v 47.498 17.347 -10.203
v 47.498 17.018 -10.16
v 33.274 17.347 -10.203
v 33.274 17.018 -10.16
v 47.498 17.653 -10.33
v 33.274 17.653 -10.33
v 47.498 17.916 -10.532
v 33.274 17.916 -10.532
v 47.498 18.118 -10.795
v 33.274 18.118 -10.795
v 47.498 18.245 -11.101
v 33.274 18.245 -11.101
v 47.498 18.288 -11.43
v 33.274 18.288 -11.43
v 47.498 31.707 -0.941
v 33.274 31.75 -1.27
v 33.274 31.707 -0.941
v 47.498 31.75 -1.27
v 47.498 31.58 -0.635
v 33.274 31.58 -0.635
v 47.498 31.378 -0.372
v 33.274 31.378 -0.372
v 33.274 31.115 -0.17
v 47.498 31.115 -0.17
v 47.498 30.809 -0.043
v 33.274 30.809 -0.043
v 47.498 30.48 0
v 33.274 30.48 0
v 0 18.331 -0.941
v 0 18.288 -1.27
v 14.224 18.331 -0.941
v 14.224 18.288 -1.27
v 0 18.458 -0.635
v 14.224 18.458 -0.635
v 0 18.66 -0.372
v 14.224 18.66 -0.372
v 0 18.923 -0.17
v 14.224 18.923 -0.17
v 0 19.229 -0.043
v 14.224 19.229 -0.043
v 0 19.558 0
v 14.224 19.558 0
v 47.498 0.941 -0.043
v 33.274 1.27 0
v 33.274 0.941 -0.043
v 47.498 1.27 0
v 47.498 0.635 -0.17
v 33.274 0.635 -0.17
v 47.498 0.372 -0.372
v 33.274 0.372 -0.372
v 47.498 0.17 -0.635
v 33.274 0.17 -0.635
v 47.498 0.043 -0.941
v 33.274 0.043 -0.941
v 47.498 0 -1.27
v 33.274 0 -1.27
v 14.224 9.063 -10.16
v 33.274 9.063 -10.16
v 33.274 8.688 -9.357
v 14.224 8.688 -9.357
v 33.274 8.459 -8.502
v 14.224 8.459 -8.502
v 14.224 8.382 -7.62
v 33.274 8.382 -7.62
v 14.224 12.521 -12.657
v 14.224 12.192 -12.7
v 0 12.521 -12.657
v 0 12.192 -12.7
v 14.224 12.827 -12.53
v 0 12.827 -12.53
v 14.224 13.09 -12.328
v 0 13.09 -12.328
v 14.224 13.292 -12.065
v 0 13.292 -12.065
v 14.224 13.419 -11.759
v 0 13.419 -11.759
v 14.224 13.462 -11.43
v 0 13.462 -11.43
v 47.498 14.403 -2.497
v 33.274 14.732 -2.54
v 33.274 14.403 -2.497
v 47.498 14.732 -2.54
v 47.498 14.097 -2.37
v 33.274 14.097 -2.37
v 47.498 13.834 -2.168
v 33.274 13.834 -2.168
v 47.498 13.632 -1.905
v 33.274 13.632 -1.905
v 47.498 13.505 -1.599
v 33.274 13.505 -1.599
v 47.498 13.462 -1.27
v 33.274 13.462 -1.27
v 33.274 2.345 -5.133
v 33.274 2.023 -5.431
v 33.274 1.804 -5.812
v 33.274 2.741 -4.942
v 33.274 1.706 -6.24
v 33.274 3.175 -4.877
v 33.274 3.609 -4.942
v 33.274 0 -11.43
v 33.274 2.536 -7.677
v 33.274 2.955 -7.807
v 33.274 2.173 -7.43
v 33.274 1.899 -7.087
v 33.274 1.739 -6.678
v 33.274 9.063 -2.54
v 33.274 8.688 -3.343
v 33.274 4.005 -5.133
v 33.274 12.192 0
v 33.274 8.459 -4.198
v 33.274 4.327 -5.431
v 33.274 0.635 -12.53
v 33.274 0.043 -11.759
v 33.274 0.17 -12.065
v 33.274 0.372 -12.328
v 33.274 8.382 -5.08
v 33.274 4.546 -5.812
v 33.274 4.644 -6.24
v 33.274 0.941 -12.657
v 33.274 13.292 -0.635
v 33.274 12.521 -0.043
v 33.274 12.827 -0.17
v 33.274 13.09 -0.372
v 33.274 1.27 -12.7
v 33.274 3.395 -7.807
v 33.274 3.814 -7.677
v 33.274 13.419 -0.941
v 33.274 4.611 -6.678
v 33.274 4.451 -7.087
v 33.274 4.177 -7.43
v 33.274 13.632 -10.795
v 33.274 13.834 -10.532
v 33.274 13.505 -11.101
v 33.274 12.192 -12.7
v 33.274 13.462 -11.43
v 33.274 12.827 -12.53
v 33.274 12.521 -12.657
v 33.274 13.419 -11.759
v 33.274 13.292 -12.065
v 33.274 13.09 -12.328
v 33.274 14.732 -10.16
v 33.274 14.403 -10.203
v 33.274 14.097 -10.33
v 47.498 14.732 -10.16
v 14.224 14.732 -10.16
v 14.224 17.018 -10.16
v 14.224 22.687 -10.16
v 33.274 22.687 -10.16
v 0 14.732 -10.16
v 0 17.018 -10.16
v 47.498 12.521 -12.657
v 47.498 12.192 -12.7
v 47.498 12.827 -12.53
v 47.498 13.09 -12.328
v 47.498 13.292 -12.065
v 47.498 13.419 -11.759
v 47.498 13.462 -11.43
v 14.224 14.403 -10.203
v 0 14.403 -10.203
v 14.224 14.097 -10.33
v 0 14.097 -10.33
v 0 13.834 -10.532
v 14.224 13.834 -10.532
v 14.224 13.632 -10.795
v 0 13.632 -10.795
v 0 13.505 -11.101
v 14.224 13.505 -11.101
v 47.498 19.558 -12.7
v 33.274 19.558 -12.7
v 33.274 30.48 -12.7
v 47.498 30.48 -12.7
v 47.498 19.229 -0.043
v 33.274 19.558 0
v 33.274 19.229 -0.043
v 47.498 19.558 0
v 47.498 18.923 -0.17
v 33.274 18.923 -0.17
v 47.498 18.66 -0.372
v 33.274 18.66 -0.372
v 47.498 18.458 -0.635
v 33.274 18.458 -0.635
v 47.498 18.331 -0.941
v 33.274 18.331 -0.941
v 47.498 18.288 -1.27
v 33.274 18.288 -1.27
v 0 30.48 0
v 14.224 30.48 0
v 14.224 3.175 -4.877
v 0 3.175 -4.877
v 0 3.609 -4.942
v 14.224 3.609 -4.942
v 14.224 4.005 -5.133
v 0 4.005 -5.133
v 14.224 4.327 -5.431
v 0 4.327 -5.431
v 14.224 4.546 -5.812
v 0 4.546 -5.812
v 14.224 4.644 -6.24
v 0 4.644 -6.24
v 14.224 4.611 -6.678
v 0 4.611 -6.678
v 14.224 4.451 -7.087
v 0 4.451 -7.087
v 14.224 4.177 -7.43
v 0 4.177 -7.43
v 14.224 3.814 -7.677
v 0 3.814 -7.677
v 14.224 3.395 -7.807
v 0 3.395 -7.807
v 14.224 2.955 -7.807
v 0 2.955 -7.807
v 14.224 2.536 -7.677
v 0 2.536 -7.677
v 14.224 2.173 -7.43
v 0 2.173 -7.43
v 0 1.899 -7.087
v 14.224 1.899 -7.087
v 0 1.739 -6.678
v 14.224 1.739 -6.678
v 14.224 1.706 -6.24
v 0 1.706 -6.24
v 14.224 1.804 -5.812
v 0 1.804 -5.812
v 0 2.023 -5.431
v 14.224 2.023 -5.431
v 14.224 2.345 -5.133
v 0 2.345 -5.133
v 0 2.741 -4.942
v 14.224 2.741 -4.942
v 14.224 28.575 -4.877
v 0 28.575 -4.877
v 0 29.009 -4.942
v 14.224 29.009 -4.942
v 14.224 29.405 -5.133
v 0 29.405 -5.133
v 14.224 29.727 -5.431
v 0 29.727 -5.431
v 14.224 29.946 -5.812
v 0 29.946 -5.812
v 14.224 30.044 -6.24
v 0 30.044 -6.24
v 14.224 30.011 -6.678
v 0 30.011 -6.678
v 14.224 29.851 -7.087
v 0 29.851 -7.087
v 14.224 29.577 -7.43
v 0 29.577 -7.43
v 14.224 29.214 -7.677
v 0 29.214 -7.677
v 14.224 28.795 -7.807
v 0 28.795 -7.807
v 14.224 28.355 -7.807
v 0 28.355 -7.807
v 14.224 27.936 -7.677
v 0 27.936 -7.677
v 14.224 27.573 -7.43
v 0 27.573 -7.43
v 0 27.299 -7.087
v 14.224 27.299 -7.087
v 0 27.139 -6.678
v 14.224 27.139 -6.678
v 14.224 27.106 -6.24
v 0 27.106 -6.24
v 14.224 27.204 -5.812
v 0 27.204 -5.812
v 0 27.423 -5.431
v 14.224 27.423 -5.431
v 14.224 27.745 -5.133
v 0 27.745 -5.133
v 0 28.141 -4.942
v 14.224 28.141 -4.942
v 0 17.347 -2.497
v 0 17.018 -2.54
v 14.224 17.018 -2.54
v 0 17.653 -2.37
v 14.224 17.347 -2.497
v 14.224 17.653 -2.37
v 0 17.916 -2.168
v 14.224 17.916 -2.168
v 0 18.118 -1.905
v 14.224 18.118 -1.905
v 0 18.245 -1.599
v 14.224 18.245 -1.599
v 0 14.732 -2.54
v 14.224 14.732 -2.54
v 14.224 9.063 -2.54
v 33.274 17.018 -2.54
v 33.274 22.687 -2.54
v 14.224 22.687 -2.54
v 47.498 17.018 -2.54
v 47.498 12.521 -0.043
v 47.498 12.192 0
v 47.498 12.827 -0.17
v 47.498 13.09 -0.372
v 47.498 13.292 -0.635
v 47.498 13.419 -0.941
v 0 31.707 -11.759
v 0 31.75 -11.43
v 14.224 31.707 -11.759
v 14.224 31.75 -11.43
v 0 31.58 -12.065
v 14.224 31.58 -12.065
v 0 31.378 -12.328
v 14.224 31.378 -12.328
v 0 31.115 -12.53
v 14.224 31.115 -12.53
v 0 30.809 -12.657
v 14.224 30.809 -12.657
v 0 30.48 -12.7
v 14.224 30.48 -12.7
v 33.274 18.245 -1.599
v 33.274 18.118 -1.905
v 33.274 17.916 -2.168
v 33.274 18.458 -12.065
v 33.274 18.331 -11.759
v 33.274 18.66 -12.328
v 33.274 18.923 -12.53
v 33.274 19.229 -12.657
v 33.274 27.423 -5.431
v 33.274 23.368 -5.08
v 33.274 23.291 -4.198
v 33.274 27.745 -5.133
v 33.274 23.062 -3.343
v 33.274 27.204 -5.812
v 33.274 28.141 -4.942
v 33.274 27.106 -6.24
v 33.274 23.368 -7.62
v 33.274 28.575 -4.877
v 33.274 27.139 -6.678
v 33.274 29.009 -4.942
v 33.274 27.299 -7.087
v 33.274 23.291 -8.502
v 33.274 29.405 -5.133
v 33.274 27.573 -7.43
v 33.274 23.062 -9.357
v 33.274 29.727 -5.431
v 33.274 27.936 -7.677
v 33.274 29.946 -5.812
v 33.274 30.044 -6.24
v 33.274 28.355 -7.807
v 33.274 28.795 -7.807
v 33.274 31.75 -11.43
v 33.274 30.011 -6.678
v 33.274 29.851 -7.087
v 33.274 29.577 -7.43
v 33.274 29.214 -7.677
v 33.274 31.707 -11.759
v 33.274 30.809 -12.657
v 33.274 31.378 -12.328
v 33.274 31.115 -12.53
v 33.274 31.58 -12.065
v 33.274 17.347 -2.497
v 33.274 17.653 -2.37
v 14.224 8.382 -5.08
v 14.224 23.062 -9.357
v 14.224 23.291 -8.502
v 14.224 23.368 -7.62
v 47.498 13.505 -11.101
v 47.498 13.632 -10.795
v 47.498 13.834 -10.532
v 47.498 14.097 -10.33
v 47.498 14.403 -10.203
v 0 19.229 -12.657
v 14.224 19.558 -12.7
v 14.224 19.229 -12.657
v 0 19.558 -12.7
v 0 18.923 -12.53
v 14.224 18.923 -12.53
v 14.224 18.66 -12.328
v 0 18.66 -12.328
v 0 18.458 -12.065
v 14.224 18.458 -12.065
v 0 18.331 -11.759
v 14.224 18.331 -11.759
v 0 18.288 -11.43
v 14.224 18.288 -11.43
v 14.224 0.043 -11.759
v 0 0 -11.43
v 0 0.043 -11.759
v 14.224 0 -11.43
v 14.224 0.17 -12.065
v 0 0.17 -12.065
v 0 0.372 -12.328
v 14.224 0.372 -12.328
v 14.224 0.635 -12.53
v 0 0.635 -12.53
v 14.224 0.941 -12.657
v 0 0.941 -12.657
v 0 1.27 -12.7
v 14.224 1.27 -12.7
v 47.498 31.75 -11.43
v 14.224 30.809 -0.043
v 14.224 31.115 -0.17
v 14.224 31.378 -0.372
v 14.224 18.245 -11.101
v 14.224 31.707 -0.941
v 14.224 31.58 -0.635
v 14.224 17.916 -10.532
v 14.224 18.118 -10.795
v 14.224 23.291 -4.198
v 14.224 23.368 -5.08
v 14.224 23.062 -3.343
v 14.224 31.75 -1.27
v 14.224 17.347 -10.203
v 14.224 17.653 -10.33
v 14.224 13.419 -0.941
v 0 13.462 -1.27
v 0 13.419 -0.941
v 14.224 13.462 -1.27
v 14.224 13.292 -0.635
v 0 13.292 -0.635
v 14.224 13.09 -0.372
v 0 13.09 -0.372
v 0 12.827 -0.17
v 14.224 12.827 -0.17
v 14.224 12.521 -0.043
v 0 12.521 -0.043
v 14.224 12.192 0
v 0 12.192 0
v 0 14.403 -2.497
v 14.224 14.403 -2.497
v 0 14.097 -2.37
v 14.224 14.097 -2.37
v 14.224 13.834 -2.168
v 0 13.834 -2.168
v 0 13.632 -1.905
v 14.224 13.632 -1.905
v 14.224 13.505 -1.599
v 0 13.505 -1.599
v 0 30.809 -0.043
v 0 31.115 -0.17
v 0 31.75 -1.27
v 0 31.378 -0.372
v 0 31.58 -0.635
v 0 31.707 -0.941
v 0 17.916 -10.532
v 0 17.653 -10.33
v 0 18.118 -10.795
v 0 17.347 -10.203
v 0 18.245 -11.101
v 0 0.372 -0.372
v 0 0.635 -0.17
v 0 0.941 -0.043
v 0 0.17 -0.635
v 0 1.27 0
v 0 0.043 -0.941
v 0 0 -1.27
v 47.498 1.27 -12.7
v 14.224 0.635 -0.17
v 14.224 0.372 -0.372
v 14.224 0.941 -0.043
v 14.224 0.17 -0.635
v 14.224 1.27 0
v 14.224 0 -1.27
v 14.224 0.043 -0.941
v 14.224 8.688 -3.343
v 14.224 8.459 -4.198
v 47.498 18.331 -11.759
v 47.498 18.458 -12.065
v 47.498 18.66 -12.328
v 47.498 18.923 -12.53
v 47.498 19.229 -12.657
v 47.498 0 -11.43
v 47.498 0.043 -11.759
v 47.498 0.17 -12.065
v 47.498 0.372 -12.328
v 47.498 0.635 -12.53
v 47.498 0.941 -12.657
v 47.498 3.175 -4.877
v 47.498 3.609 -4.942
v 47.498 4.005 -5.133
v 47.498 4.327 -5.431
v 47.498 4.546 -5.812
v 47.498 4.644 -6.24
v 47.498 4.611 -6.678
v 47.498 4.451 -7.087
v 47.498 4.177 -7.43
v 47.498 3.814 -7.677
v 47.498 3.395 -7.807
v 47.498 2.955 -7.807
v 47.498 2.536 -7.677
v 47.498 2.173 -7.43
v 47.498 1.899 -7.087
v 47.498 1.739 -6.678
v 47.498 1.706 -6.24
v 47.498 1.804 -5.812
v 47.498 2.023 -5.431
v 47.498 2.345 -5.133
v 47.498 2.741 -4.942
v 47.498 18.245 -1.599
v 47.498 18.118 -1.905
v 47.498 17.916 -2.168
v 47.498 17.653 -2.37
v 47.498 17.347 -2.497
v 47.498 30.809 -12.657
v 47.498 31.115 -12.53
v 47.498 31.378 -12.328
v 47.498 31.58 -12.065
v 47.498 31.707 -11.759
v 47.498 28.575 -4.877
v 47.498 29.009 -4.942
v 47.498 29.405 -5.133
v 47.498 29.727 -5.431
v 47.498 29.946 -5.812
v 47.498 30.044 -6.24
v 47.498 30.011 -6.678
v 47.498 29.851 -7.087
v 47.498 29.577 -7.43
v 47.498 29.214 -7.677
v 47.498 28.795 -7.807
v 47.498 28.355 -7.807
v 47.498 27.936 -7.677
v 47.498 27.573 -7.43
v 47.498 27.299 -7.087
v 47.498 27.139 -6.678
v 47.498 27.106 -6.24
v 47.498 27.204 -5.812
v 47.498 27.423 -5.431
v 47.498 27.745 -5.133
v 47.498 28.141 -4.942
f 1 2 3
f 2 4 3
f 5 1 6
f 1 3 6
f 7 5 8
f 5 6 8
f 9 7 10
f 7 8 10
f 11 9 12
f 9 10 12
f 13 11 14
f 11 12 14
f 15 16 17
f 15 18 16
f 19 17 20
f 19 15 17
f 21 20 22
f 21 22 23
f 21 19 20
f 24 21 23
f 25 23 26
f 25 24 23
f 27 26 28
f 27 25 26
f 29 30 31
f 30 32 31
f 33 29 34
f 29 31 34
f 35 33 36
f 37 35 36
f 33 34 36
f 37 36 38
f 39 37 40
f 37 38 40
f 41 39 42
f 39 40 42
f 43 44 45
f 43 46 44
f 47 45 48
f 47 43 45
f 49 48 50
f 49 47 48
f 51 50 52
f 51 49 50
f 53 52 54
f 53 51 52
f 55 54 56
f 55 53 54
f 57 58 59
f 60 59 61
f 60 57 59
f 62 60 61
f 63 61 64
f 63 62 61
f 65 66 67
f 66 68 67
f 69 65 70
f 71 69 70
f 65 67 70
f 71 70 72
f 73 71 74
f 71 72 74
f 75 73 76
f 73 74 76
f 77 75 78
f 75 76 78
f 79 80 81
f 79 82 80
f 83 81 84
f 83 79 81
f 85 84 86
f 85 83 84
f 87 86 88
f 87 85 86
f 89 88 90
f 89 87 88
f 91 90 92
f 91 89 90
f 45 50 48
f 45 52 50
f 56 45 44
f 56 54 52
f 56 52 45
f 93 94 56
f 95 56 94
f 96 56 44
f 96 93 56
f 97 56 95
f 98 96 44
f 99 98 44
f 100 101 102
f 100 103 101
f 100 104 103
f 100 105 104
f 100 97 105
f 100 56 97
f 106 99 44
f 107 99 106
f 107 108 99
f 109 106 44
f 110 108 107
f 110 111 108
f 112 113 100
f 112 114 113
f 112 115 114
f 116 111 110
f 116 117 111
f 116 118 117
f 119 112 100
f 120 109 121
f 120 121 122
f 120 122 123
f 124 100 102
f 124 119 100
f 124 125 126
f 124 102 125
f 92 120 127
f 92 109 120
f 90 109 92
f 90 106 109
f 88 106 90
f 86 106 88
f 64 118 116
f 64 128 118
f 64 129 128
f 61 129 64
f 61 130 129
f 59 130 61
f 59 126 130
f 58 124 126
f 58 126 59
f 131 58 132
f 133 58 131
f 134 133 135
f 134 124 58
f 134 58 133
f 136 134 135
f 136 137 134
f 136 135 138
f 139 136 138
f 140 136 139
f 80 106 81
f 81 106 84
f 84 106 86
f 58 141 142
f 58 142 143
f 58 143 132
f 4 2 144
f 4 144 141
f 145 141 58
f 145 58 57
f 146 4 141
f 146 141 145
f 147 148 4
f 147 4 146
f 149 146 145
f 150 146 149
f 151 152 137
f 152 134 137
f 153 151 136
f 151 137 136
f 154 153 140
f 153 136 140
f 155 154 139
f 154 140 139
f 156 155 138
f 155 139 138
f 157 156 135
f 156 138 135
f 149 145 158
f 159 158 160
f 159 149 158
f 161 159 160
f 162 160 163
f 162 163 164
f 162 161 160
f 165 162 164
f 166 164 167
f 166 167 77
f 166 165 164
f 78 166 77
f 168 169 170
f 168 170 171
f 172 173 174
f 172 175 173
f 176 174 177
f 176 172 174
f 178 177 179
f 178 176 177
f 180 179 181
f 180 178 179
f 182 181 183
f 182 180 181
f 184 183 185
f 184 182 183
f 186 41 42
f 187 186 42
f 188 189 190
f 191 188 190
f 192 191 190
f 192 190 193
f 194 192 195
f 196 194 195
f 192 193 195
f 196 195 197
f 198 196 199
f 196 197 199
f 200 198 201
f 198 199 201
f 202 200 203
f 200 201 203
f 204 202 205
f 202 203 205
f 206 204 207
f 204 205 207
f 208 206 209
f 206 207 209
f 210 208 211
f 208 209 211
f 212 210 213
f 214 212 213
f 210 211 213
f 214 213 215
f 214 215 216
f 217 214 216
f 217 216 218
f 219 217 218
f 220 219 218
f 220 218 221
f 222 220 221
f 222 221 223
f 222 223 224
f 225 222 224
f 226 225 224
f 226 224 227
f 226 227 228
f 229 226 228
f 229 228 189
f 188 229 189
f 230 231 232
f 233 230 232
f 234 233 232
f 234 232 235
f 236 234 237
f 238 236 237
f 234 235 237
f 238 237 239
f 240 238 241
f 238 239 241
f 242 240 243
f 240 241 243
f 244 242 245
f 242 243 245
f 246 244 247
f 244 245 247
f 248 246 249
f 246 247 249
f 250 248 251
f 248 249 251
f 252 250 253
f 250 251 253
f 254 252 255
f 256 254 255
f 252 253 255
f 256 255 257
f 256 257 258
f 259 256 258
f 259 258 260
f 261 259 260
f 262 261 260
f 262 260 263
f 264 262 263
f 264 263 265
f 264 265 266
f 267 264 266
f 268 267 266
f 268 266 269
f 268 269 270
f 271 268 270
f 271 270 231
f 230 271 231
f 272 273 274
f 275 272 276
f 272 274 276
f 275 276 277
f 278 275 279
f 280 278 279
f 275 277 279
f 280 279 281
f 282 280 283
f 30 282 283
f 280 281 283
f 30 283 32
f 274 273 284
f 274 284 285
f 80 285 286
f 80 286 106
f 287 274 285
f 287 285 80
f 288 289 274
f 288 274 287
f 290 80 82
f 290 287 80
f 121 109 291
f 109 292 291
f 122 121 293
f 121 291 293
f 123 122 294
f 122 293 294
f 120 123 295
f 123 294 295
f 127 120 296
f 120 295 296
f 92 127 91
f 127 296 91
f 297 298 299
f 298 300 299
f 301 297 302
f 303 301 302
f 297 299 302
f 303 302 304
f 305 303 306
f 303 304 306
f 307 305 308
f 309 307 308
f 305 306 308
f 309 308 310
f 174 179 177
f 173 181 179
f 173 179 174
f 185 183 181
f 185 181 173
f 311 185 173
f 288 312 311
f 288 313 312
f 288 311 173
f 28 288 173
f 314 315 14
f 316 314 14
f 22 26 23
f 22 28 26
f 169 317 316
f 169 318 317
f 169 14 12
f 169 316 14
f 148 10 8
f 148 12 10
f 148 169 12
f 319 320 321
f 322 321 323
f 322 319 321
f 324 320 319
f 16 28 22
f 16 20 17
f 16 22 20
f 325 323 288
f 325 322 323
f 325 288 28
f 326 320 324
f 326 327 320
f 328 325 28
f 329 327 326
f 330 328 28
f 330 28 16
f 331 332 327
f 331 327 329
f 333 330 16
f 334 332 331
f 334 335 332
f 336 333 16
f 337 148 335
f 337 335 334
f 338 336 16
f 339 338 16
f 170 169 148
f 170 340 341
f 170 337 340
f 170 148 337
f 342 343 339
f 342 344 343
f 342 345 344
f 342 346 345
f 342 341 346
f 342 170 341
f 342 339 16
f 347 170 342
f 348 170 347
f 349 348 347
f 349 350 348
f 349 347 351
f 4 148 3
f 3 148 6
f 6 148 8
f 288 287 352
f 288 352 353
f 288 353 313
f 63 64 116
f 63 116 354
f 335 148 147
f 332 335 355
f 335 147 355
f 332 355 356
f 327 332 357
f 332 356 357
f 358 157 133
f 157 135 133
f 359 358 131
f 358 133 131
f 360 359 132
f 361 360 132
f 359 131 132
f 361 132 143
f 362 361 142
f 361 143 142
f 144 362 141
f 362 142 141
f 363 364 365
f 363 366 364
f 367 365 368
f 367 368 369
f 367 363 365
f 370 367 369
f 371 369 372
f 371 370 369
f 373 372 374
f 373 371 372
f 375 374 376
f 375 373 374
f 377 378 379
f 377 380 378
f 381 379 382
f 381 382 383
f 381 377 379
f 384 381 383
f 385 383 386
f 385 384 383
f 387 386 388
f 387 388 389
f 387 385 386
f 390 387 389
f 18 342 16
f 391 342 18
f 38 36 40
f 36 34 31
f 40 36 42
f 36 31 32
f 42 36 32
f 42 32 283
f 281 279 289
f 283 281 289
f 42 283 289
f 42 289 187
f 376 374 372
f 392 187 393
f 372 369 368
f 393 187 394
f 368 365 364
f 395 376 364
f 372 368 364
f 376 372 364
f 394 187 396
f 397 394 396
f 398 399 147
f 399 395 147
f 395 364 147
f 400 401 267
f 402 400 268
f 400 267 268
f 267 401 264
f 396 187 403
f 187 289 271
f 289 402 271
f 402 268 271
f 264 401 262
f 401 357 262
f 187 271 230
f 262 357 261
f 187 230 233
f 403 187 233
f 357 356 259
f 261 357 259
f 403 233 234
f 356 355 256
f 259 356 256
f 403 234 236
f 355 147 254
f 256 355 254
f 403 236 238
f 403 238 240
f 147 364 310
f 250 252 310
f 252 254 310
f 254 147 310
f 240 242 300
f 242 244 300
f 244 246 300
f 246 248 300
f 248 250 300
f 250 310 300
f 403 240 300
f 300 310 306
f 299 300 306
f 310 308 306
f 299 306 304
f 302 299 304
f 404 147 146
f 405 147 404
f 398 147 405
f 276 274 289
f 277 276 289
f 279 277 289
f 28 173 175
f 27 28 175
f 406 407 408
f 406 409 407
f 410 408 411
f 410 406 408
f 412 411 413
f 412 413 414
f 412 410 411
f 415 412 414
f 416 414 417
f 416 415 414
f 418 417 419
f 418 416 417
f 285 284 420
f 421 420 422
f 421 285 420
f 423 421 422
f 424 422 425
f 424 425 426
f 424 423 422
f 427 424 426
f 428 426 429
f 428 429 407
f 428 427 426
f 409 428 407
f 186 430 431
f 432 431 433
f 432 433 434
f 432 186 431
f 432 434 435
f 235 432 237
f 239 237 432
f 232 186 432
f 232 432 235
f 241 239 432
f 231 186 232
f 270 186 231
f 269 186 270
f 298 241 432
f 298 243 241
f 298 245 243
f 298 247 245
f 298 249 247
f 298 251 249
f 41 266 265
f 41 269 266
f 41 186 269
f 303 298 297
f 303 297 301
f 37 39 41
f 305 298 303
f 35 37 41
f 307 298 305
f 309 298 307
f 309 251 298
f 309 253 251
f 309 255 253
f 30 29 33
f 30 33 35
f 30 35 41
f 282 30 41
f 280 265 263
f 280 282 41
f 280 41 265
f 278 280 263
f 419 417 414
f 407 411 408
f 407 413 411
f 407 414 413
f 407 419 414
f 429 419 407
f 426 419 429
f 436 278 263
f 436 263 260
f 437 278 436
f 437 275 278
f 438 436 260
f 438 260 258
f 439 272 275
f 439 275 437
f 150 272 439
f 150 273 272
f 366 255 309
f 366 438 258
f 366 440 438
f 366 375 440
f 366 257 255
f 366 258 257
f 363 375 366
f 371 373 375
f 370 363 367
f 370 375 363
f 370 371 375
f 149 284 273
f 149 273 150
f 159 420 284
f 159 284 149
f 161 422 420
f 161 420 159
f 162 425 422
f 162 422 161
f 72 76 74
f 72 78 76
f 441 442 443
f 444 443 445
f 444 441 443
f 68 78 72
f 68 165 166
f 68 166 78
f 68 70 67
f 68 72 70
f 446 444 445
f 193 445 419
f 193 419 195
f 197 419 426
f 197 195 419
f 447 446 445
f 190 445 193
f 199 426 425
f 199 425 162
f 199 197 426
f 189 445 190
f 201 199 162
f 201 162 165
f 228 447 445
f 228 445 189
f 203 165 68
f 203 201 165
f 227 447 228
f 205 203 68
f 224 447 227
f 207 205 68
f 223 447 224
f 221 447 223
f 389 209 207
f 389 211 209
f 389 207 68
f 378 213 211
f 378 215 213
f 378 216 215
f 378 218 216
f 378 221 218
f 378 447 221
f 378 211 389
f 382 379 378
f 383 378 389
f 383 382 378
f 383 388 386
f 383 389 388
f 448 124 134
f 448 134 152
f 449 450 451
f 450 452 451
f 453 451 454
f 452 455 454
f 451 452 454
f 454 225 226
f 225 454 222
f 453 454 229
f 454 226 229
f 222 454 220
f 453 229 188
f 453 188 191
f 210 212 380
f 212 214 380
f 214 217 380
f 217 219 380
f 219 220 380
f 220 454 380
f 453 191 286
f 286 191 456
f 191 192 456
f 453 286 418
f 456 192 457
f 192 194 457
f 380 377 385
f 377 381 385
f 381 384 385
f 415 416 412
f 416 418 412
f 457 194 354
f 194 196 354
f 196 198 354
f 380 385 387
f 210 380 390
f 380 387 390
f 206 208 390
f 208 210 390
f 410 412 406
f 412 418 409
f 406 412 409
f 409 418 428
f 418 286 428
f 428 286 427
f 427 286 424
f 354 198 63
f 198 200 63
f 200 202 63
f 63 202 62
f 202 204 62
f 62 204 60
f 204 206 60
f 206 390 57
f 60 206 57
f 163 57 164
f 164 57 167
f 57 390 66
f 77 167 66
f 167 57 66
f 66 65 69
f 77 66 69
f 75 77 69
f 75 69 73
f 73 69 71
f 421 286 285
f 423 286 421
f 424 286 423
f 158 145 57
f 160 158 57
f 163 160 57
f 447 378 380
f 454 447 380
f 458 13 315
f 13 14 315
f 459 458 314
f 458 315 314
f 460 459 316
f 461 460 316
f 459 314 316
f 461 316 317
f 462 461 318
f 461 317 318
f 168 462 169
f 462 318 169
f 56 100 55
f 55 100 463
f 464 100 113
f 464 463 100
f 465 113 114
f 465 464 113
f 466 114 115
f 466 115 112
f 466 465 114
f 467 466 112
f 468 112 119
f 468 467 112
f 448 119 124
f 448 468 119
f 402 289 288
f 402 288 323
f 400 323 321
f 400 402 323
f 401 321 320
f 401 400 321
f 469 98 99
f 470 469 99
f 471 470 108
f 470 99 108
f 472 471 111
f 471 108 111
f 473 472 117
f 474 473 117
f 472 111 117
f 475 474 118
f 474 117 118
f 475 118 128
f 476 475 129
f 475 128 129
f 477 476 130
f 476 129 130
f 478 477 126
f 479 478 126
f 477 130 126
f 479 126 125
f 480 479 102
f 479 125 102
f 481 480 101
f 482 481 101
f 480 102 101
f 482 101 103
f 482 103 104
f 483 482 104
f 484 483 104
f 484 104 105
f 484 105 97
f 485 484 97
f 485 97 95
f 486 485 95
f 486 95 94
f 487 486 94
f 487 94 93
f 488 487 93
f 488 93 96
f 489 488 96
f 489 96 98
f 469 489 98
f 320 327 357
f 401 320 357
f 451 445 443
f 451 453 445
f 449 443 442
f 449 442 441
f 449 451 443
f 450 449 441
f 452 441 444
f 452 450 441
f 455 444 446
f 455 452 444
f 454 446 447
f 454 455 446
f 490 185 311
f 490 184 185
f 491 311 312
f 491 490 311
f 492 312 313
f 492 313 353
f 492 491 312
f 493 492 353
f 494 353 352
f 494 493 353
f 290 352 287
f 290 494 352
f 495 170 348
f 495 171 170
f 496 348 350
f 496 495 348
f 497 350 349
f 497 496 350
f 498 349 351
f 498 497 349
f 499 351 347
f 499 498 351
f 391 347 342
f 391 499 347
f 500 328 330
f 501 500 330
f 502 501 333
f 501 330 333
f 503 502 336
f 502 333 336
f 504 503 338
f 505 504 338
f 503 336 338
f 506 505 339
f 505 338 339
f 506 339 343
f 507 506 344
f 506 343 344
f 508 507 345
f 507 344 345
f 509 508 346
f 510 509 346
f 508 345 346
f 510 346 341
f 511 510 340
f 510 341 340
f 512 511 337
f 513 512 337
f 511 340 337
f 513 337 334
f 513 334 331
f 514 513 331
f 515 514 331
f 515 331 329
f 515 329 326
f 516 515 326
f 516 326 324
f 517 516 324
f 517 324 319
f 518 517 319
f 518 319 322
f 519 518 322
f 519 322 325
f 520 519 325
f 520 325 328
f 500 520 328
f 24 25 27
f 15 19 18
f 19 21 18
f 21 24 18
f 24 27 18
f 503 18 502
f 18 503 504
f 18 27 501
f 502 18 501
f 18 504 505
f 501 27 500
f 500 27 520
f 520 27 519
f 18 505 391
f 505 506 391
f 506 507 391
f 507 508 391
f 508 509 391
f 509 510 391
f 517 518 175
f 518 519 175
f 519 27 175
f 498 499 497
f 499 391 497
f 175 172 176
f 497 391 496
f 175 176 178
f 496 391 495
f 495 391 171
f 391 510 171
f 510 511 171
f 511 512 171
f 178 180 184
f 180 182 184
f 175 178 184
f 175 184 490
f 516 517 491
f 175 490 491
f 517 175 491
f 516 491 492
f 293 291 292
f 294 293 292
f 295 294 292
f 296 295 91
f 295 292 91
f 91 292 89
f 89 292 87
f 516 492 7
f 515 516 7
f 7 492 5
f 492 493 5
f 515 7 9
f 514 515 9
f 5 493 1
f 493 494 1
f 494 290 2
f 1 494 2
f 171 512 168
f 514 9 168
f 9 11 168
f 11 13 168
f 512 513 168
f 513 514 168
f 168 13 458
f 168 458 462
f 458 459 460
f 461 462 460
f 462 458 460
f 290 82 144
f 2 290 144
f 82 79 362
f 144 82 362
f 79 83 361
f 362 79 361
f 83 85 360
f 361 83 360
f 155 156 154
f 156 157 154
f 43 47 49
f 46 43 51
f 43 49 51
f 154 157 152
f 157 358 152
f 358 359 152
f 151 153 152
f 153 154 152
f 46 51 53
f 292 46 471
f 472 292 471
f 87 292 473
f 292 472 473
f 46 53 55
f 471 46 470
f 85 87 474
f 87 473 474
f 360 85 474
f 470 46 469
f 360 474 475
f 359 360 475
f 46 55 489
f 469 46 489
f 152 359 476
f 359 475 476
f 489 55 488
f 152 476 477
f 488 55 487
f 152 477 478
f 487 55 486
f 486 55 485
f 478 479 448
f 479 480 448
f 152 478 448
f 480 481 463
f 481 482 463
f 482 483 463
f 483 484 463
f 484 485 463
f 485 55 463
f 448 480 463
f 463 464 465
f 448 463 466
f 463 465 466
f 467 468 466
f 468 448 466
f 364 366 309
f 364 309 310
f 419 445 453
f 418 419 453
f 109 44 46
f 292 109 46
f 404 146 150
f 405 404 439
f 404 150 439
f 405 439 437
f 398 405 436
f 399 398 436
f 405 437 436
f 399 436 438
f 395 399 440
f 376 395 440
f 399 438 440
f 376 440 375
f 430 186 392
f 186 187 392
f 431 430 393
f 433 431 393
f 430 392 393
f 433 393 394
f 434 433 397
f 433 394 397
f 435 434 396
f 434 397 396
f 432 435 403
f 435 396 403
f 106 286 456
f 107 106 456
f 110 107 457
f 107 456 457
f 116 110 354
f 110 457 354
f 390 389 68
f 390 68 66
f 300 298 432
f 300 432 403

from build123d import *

# Parameters (mm, degrees)
SKETCH1_W           = 47.498
SKETCH1_H           = 12.7
BOSS_EXTRUDE1_DEPTH = 31.75
SKETCH2_R           = 1.4732
CUT_EXTRUDE1_DEPTH  = 47.498
SKETCH3_W           = 19.05
SKETCH3_H           = 8.382
CUT_EXTRUDE2_DEPTH  = 47.498
FILLET1_R           = 5.08
SKETCH4_W           = 47.498
SKETCH4_H           = 4.826
CUT_EXTRUDE3_DEPTH  = 2.54
SKETCH5_W           = 47.498
SKETCH5_H           = 4.826
CUT_EXTRUDE4_DEPTH  = 2.54
SKETCH6_W           = 19.05
SKETCH6_H           = 19.05
CUT_EXTRUDE5_DEPTH  = 2.54
SKETCH7_W           = 19.05
SKETCH7_H           = 17.006147254
CUT_EXTRUDE6_DEPTH  = 2.54
FILLET2_R           = 1.27


with BuildPart() as part:
    # Sketch1 → Boss-Extrude1 (new body)
    with BuildSketch(Plane(origin=(0, 0, 0), x_dir=(1, 0, 0), z_dir=(0, 1, 0))):
        with Locations((23.749, 6.35)):
            Rectangle(SKETCH1_W, SKETCH1_H)
    extrude(amount=BOSS_EXTRUDE1_DEPTH)

    # Sketch2 → Cut-Extrude1 (cut)
    with BuildSketch(Plane.ZY):
        with Locations((-6.35, 3.175)):
            Circle(SKETCH2_R)
        with Locations((-6.35, 28.575)):
            Circle(SKETCH2_R)
    extrude(amount=-CUT_EXTRUDE1_DEPTH, mode=Mode.SUBTRACT)

    # Sketch3 → Cut-Extrude2 (cut)
    with BuildSketch(Plane(origin=(0, 0, -12.7), x_dir=(-1, 0, 0), z_dir=(0, 0, -1))):
        with Locations((-23.749, 4.191)):
            Rectangle(SKETCH3_W, SKETCH3_H)
        with Locations((-23.749, 27.559)):
            Rectangle(SKETCH3_W, SKETCH3_H)
    extrude(amount=-CUT_EXTRUDE2_DEPTH, mode=Mode.SUBTRACT)

    # Fillet1
    fillet1_edges = [part.edges().sort_by_distance(p)[0] for p in [
        (23.749, 8.382, 0),
        (23.749, 8.382, -12.7),
        (23.749, 23.368, 0),
        (23.749, 23.368, -12.7),
    ]]
    fillet(fillet1_edges, radius=FILLET1_R)

    # Sketch4 → Cut-Extrude3 (cut)
    with BuildSketch(Plane.XY):
        with Locations((23.749, 15.875)):
            Rectangle(SKETCH4_W, SKETCH4_H)
    extrude(amount=-CUT_EXTRUDE3_DEPTH, mode=Mode.SUBTRACT)

    # Sketch5 → Cut-Extrude4 (cut)
    with BuildSketch(Plane(origin=(0, 0, -12.7), x_dir=(-1, 0, 0), z_dir=(0, 0, -1))):
        with Locations((-23.749, 15.875)):
            Rectangle(SKETCH5_W, SKETCH5_H)
    extrude(amount=-CUT_EXTRUDE4_DEPTH, mode=Mode.SUBTRACT)

    # Sketch6 → Cut-Extrude5 (cut)
    with BuildSketch(Plane.XY):
        with Locations((23.749, 17.907)):
            Rectangle(SKETCH6_W, SKETCH6_H)
    extrude(amount=-CUT_EXTRUDE5_DEPTH, mode=Mode.SUBTRACT)

    # Sketch7 → Cut-Extrude6 (cut)
    with BuildSketch(Plane(origin=(0, 0, -12.7), x_dir=(-1, 0, 0), z_dir=(0, 0, -1))):
        with Locations((-23.749, 16.885073627)):
            Rectangle(SKETCH7_W, SKETCH7_H)
    extrude(amount=-CUT_EXTRUDE6_DEPTH, mode=Mode.SUBTRACT)

    # Fillet2
    fillet2_edges = [part.edges().sort_by_distance(p)[0] for p in [
        (40.386, 13.462, 0),
        (40.386, 13.462, -2.54),
        (40.386, 18.288, -2.54),
        (40.386, 18.288, 0),
        (7.112, 13.462, 0),
        (7.112, 13.462, -2.54),
        (7.112, 18.288, -2.54),
        (7.112, 18.288, 0),
        (7.112, 31.75, 0),
        (40.386, 31.75, 0),
        (7.112, 0, 0),
        (40.386, 0, 0),
        (40.386, 0, -12.7),
        (40.386, 31.75, -12.7),
        (40.386, 13.462, -12.7),
        (40.386, 13.462, -10.16),
        (40.386, 18.288, -10.16),
        (40.386, 18.288, -12.7),
        (7.112, 31.75, -12.7),
        (7.112, 18.288, -12.7),
        (7.112, 18.288, -10.16),
        (7.112, 0, -12.7),
        (7.112, 13.462, -12.7),
        (7.112, 13.462, -10.16),
    ]]
    fillet(fillet2_edges, radius=FILLET2_R - 0.0001)  # a hair under: the kernel refuses the full size


solid = part.part
